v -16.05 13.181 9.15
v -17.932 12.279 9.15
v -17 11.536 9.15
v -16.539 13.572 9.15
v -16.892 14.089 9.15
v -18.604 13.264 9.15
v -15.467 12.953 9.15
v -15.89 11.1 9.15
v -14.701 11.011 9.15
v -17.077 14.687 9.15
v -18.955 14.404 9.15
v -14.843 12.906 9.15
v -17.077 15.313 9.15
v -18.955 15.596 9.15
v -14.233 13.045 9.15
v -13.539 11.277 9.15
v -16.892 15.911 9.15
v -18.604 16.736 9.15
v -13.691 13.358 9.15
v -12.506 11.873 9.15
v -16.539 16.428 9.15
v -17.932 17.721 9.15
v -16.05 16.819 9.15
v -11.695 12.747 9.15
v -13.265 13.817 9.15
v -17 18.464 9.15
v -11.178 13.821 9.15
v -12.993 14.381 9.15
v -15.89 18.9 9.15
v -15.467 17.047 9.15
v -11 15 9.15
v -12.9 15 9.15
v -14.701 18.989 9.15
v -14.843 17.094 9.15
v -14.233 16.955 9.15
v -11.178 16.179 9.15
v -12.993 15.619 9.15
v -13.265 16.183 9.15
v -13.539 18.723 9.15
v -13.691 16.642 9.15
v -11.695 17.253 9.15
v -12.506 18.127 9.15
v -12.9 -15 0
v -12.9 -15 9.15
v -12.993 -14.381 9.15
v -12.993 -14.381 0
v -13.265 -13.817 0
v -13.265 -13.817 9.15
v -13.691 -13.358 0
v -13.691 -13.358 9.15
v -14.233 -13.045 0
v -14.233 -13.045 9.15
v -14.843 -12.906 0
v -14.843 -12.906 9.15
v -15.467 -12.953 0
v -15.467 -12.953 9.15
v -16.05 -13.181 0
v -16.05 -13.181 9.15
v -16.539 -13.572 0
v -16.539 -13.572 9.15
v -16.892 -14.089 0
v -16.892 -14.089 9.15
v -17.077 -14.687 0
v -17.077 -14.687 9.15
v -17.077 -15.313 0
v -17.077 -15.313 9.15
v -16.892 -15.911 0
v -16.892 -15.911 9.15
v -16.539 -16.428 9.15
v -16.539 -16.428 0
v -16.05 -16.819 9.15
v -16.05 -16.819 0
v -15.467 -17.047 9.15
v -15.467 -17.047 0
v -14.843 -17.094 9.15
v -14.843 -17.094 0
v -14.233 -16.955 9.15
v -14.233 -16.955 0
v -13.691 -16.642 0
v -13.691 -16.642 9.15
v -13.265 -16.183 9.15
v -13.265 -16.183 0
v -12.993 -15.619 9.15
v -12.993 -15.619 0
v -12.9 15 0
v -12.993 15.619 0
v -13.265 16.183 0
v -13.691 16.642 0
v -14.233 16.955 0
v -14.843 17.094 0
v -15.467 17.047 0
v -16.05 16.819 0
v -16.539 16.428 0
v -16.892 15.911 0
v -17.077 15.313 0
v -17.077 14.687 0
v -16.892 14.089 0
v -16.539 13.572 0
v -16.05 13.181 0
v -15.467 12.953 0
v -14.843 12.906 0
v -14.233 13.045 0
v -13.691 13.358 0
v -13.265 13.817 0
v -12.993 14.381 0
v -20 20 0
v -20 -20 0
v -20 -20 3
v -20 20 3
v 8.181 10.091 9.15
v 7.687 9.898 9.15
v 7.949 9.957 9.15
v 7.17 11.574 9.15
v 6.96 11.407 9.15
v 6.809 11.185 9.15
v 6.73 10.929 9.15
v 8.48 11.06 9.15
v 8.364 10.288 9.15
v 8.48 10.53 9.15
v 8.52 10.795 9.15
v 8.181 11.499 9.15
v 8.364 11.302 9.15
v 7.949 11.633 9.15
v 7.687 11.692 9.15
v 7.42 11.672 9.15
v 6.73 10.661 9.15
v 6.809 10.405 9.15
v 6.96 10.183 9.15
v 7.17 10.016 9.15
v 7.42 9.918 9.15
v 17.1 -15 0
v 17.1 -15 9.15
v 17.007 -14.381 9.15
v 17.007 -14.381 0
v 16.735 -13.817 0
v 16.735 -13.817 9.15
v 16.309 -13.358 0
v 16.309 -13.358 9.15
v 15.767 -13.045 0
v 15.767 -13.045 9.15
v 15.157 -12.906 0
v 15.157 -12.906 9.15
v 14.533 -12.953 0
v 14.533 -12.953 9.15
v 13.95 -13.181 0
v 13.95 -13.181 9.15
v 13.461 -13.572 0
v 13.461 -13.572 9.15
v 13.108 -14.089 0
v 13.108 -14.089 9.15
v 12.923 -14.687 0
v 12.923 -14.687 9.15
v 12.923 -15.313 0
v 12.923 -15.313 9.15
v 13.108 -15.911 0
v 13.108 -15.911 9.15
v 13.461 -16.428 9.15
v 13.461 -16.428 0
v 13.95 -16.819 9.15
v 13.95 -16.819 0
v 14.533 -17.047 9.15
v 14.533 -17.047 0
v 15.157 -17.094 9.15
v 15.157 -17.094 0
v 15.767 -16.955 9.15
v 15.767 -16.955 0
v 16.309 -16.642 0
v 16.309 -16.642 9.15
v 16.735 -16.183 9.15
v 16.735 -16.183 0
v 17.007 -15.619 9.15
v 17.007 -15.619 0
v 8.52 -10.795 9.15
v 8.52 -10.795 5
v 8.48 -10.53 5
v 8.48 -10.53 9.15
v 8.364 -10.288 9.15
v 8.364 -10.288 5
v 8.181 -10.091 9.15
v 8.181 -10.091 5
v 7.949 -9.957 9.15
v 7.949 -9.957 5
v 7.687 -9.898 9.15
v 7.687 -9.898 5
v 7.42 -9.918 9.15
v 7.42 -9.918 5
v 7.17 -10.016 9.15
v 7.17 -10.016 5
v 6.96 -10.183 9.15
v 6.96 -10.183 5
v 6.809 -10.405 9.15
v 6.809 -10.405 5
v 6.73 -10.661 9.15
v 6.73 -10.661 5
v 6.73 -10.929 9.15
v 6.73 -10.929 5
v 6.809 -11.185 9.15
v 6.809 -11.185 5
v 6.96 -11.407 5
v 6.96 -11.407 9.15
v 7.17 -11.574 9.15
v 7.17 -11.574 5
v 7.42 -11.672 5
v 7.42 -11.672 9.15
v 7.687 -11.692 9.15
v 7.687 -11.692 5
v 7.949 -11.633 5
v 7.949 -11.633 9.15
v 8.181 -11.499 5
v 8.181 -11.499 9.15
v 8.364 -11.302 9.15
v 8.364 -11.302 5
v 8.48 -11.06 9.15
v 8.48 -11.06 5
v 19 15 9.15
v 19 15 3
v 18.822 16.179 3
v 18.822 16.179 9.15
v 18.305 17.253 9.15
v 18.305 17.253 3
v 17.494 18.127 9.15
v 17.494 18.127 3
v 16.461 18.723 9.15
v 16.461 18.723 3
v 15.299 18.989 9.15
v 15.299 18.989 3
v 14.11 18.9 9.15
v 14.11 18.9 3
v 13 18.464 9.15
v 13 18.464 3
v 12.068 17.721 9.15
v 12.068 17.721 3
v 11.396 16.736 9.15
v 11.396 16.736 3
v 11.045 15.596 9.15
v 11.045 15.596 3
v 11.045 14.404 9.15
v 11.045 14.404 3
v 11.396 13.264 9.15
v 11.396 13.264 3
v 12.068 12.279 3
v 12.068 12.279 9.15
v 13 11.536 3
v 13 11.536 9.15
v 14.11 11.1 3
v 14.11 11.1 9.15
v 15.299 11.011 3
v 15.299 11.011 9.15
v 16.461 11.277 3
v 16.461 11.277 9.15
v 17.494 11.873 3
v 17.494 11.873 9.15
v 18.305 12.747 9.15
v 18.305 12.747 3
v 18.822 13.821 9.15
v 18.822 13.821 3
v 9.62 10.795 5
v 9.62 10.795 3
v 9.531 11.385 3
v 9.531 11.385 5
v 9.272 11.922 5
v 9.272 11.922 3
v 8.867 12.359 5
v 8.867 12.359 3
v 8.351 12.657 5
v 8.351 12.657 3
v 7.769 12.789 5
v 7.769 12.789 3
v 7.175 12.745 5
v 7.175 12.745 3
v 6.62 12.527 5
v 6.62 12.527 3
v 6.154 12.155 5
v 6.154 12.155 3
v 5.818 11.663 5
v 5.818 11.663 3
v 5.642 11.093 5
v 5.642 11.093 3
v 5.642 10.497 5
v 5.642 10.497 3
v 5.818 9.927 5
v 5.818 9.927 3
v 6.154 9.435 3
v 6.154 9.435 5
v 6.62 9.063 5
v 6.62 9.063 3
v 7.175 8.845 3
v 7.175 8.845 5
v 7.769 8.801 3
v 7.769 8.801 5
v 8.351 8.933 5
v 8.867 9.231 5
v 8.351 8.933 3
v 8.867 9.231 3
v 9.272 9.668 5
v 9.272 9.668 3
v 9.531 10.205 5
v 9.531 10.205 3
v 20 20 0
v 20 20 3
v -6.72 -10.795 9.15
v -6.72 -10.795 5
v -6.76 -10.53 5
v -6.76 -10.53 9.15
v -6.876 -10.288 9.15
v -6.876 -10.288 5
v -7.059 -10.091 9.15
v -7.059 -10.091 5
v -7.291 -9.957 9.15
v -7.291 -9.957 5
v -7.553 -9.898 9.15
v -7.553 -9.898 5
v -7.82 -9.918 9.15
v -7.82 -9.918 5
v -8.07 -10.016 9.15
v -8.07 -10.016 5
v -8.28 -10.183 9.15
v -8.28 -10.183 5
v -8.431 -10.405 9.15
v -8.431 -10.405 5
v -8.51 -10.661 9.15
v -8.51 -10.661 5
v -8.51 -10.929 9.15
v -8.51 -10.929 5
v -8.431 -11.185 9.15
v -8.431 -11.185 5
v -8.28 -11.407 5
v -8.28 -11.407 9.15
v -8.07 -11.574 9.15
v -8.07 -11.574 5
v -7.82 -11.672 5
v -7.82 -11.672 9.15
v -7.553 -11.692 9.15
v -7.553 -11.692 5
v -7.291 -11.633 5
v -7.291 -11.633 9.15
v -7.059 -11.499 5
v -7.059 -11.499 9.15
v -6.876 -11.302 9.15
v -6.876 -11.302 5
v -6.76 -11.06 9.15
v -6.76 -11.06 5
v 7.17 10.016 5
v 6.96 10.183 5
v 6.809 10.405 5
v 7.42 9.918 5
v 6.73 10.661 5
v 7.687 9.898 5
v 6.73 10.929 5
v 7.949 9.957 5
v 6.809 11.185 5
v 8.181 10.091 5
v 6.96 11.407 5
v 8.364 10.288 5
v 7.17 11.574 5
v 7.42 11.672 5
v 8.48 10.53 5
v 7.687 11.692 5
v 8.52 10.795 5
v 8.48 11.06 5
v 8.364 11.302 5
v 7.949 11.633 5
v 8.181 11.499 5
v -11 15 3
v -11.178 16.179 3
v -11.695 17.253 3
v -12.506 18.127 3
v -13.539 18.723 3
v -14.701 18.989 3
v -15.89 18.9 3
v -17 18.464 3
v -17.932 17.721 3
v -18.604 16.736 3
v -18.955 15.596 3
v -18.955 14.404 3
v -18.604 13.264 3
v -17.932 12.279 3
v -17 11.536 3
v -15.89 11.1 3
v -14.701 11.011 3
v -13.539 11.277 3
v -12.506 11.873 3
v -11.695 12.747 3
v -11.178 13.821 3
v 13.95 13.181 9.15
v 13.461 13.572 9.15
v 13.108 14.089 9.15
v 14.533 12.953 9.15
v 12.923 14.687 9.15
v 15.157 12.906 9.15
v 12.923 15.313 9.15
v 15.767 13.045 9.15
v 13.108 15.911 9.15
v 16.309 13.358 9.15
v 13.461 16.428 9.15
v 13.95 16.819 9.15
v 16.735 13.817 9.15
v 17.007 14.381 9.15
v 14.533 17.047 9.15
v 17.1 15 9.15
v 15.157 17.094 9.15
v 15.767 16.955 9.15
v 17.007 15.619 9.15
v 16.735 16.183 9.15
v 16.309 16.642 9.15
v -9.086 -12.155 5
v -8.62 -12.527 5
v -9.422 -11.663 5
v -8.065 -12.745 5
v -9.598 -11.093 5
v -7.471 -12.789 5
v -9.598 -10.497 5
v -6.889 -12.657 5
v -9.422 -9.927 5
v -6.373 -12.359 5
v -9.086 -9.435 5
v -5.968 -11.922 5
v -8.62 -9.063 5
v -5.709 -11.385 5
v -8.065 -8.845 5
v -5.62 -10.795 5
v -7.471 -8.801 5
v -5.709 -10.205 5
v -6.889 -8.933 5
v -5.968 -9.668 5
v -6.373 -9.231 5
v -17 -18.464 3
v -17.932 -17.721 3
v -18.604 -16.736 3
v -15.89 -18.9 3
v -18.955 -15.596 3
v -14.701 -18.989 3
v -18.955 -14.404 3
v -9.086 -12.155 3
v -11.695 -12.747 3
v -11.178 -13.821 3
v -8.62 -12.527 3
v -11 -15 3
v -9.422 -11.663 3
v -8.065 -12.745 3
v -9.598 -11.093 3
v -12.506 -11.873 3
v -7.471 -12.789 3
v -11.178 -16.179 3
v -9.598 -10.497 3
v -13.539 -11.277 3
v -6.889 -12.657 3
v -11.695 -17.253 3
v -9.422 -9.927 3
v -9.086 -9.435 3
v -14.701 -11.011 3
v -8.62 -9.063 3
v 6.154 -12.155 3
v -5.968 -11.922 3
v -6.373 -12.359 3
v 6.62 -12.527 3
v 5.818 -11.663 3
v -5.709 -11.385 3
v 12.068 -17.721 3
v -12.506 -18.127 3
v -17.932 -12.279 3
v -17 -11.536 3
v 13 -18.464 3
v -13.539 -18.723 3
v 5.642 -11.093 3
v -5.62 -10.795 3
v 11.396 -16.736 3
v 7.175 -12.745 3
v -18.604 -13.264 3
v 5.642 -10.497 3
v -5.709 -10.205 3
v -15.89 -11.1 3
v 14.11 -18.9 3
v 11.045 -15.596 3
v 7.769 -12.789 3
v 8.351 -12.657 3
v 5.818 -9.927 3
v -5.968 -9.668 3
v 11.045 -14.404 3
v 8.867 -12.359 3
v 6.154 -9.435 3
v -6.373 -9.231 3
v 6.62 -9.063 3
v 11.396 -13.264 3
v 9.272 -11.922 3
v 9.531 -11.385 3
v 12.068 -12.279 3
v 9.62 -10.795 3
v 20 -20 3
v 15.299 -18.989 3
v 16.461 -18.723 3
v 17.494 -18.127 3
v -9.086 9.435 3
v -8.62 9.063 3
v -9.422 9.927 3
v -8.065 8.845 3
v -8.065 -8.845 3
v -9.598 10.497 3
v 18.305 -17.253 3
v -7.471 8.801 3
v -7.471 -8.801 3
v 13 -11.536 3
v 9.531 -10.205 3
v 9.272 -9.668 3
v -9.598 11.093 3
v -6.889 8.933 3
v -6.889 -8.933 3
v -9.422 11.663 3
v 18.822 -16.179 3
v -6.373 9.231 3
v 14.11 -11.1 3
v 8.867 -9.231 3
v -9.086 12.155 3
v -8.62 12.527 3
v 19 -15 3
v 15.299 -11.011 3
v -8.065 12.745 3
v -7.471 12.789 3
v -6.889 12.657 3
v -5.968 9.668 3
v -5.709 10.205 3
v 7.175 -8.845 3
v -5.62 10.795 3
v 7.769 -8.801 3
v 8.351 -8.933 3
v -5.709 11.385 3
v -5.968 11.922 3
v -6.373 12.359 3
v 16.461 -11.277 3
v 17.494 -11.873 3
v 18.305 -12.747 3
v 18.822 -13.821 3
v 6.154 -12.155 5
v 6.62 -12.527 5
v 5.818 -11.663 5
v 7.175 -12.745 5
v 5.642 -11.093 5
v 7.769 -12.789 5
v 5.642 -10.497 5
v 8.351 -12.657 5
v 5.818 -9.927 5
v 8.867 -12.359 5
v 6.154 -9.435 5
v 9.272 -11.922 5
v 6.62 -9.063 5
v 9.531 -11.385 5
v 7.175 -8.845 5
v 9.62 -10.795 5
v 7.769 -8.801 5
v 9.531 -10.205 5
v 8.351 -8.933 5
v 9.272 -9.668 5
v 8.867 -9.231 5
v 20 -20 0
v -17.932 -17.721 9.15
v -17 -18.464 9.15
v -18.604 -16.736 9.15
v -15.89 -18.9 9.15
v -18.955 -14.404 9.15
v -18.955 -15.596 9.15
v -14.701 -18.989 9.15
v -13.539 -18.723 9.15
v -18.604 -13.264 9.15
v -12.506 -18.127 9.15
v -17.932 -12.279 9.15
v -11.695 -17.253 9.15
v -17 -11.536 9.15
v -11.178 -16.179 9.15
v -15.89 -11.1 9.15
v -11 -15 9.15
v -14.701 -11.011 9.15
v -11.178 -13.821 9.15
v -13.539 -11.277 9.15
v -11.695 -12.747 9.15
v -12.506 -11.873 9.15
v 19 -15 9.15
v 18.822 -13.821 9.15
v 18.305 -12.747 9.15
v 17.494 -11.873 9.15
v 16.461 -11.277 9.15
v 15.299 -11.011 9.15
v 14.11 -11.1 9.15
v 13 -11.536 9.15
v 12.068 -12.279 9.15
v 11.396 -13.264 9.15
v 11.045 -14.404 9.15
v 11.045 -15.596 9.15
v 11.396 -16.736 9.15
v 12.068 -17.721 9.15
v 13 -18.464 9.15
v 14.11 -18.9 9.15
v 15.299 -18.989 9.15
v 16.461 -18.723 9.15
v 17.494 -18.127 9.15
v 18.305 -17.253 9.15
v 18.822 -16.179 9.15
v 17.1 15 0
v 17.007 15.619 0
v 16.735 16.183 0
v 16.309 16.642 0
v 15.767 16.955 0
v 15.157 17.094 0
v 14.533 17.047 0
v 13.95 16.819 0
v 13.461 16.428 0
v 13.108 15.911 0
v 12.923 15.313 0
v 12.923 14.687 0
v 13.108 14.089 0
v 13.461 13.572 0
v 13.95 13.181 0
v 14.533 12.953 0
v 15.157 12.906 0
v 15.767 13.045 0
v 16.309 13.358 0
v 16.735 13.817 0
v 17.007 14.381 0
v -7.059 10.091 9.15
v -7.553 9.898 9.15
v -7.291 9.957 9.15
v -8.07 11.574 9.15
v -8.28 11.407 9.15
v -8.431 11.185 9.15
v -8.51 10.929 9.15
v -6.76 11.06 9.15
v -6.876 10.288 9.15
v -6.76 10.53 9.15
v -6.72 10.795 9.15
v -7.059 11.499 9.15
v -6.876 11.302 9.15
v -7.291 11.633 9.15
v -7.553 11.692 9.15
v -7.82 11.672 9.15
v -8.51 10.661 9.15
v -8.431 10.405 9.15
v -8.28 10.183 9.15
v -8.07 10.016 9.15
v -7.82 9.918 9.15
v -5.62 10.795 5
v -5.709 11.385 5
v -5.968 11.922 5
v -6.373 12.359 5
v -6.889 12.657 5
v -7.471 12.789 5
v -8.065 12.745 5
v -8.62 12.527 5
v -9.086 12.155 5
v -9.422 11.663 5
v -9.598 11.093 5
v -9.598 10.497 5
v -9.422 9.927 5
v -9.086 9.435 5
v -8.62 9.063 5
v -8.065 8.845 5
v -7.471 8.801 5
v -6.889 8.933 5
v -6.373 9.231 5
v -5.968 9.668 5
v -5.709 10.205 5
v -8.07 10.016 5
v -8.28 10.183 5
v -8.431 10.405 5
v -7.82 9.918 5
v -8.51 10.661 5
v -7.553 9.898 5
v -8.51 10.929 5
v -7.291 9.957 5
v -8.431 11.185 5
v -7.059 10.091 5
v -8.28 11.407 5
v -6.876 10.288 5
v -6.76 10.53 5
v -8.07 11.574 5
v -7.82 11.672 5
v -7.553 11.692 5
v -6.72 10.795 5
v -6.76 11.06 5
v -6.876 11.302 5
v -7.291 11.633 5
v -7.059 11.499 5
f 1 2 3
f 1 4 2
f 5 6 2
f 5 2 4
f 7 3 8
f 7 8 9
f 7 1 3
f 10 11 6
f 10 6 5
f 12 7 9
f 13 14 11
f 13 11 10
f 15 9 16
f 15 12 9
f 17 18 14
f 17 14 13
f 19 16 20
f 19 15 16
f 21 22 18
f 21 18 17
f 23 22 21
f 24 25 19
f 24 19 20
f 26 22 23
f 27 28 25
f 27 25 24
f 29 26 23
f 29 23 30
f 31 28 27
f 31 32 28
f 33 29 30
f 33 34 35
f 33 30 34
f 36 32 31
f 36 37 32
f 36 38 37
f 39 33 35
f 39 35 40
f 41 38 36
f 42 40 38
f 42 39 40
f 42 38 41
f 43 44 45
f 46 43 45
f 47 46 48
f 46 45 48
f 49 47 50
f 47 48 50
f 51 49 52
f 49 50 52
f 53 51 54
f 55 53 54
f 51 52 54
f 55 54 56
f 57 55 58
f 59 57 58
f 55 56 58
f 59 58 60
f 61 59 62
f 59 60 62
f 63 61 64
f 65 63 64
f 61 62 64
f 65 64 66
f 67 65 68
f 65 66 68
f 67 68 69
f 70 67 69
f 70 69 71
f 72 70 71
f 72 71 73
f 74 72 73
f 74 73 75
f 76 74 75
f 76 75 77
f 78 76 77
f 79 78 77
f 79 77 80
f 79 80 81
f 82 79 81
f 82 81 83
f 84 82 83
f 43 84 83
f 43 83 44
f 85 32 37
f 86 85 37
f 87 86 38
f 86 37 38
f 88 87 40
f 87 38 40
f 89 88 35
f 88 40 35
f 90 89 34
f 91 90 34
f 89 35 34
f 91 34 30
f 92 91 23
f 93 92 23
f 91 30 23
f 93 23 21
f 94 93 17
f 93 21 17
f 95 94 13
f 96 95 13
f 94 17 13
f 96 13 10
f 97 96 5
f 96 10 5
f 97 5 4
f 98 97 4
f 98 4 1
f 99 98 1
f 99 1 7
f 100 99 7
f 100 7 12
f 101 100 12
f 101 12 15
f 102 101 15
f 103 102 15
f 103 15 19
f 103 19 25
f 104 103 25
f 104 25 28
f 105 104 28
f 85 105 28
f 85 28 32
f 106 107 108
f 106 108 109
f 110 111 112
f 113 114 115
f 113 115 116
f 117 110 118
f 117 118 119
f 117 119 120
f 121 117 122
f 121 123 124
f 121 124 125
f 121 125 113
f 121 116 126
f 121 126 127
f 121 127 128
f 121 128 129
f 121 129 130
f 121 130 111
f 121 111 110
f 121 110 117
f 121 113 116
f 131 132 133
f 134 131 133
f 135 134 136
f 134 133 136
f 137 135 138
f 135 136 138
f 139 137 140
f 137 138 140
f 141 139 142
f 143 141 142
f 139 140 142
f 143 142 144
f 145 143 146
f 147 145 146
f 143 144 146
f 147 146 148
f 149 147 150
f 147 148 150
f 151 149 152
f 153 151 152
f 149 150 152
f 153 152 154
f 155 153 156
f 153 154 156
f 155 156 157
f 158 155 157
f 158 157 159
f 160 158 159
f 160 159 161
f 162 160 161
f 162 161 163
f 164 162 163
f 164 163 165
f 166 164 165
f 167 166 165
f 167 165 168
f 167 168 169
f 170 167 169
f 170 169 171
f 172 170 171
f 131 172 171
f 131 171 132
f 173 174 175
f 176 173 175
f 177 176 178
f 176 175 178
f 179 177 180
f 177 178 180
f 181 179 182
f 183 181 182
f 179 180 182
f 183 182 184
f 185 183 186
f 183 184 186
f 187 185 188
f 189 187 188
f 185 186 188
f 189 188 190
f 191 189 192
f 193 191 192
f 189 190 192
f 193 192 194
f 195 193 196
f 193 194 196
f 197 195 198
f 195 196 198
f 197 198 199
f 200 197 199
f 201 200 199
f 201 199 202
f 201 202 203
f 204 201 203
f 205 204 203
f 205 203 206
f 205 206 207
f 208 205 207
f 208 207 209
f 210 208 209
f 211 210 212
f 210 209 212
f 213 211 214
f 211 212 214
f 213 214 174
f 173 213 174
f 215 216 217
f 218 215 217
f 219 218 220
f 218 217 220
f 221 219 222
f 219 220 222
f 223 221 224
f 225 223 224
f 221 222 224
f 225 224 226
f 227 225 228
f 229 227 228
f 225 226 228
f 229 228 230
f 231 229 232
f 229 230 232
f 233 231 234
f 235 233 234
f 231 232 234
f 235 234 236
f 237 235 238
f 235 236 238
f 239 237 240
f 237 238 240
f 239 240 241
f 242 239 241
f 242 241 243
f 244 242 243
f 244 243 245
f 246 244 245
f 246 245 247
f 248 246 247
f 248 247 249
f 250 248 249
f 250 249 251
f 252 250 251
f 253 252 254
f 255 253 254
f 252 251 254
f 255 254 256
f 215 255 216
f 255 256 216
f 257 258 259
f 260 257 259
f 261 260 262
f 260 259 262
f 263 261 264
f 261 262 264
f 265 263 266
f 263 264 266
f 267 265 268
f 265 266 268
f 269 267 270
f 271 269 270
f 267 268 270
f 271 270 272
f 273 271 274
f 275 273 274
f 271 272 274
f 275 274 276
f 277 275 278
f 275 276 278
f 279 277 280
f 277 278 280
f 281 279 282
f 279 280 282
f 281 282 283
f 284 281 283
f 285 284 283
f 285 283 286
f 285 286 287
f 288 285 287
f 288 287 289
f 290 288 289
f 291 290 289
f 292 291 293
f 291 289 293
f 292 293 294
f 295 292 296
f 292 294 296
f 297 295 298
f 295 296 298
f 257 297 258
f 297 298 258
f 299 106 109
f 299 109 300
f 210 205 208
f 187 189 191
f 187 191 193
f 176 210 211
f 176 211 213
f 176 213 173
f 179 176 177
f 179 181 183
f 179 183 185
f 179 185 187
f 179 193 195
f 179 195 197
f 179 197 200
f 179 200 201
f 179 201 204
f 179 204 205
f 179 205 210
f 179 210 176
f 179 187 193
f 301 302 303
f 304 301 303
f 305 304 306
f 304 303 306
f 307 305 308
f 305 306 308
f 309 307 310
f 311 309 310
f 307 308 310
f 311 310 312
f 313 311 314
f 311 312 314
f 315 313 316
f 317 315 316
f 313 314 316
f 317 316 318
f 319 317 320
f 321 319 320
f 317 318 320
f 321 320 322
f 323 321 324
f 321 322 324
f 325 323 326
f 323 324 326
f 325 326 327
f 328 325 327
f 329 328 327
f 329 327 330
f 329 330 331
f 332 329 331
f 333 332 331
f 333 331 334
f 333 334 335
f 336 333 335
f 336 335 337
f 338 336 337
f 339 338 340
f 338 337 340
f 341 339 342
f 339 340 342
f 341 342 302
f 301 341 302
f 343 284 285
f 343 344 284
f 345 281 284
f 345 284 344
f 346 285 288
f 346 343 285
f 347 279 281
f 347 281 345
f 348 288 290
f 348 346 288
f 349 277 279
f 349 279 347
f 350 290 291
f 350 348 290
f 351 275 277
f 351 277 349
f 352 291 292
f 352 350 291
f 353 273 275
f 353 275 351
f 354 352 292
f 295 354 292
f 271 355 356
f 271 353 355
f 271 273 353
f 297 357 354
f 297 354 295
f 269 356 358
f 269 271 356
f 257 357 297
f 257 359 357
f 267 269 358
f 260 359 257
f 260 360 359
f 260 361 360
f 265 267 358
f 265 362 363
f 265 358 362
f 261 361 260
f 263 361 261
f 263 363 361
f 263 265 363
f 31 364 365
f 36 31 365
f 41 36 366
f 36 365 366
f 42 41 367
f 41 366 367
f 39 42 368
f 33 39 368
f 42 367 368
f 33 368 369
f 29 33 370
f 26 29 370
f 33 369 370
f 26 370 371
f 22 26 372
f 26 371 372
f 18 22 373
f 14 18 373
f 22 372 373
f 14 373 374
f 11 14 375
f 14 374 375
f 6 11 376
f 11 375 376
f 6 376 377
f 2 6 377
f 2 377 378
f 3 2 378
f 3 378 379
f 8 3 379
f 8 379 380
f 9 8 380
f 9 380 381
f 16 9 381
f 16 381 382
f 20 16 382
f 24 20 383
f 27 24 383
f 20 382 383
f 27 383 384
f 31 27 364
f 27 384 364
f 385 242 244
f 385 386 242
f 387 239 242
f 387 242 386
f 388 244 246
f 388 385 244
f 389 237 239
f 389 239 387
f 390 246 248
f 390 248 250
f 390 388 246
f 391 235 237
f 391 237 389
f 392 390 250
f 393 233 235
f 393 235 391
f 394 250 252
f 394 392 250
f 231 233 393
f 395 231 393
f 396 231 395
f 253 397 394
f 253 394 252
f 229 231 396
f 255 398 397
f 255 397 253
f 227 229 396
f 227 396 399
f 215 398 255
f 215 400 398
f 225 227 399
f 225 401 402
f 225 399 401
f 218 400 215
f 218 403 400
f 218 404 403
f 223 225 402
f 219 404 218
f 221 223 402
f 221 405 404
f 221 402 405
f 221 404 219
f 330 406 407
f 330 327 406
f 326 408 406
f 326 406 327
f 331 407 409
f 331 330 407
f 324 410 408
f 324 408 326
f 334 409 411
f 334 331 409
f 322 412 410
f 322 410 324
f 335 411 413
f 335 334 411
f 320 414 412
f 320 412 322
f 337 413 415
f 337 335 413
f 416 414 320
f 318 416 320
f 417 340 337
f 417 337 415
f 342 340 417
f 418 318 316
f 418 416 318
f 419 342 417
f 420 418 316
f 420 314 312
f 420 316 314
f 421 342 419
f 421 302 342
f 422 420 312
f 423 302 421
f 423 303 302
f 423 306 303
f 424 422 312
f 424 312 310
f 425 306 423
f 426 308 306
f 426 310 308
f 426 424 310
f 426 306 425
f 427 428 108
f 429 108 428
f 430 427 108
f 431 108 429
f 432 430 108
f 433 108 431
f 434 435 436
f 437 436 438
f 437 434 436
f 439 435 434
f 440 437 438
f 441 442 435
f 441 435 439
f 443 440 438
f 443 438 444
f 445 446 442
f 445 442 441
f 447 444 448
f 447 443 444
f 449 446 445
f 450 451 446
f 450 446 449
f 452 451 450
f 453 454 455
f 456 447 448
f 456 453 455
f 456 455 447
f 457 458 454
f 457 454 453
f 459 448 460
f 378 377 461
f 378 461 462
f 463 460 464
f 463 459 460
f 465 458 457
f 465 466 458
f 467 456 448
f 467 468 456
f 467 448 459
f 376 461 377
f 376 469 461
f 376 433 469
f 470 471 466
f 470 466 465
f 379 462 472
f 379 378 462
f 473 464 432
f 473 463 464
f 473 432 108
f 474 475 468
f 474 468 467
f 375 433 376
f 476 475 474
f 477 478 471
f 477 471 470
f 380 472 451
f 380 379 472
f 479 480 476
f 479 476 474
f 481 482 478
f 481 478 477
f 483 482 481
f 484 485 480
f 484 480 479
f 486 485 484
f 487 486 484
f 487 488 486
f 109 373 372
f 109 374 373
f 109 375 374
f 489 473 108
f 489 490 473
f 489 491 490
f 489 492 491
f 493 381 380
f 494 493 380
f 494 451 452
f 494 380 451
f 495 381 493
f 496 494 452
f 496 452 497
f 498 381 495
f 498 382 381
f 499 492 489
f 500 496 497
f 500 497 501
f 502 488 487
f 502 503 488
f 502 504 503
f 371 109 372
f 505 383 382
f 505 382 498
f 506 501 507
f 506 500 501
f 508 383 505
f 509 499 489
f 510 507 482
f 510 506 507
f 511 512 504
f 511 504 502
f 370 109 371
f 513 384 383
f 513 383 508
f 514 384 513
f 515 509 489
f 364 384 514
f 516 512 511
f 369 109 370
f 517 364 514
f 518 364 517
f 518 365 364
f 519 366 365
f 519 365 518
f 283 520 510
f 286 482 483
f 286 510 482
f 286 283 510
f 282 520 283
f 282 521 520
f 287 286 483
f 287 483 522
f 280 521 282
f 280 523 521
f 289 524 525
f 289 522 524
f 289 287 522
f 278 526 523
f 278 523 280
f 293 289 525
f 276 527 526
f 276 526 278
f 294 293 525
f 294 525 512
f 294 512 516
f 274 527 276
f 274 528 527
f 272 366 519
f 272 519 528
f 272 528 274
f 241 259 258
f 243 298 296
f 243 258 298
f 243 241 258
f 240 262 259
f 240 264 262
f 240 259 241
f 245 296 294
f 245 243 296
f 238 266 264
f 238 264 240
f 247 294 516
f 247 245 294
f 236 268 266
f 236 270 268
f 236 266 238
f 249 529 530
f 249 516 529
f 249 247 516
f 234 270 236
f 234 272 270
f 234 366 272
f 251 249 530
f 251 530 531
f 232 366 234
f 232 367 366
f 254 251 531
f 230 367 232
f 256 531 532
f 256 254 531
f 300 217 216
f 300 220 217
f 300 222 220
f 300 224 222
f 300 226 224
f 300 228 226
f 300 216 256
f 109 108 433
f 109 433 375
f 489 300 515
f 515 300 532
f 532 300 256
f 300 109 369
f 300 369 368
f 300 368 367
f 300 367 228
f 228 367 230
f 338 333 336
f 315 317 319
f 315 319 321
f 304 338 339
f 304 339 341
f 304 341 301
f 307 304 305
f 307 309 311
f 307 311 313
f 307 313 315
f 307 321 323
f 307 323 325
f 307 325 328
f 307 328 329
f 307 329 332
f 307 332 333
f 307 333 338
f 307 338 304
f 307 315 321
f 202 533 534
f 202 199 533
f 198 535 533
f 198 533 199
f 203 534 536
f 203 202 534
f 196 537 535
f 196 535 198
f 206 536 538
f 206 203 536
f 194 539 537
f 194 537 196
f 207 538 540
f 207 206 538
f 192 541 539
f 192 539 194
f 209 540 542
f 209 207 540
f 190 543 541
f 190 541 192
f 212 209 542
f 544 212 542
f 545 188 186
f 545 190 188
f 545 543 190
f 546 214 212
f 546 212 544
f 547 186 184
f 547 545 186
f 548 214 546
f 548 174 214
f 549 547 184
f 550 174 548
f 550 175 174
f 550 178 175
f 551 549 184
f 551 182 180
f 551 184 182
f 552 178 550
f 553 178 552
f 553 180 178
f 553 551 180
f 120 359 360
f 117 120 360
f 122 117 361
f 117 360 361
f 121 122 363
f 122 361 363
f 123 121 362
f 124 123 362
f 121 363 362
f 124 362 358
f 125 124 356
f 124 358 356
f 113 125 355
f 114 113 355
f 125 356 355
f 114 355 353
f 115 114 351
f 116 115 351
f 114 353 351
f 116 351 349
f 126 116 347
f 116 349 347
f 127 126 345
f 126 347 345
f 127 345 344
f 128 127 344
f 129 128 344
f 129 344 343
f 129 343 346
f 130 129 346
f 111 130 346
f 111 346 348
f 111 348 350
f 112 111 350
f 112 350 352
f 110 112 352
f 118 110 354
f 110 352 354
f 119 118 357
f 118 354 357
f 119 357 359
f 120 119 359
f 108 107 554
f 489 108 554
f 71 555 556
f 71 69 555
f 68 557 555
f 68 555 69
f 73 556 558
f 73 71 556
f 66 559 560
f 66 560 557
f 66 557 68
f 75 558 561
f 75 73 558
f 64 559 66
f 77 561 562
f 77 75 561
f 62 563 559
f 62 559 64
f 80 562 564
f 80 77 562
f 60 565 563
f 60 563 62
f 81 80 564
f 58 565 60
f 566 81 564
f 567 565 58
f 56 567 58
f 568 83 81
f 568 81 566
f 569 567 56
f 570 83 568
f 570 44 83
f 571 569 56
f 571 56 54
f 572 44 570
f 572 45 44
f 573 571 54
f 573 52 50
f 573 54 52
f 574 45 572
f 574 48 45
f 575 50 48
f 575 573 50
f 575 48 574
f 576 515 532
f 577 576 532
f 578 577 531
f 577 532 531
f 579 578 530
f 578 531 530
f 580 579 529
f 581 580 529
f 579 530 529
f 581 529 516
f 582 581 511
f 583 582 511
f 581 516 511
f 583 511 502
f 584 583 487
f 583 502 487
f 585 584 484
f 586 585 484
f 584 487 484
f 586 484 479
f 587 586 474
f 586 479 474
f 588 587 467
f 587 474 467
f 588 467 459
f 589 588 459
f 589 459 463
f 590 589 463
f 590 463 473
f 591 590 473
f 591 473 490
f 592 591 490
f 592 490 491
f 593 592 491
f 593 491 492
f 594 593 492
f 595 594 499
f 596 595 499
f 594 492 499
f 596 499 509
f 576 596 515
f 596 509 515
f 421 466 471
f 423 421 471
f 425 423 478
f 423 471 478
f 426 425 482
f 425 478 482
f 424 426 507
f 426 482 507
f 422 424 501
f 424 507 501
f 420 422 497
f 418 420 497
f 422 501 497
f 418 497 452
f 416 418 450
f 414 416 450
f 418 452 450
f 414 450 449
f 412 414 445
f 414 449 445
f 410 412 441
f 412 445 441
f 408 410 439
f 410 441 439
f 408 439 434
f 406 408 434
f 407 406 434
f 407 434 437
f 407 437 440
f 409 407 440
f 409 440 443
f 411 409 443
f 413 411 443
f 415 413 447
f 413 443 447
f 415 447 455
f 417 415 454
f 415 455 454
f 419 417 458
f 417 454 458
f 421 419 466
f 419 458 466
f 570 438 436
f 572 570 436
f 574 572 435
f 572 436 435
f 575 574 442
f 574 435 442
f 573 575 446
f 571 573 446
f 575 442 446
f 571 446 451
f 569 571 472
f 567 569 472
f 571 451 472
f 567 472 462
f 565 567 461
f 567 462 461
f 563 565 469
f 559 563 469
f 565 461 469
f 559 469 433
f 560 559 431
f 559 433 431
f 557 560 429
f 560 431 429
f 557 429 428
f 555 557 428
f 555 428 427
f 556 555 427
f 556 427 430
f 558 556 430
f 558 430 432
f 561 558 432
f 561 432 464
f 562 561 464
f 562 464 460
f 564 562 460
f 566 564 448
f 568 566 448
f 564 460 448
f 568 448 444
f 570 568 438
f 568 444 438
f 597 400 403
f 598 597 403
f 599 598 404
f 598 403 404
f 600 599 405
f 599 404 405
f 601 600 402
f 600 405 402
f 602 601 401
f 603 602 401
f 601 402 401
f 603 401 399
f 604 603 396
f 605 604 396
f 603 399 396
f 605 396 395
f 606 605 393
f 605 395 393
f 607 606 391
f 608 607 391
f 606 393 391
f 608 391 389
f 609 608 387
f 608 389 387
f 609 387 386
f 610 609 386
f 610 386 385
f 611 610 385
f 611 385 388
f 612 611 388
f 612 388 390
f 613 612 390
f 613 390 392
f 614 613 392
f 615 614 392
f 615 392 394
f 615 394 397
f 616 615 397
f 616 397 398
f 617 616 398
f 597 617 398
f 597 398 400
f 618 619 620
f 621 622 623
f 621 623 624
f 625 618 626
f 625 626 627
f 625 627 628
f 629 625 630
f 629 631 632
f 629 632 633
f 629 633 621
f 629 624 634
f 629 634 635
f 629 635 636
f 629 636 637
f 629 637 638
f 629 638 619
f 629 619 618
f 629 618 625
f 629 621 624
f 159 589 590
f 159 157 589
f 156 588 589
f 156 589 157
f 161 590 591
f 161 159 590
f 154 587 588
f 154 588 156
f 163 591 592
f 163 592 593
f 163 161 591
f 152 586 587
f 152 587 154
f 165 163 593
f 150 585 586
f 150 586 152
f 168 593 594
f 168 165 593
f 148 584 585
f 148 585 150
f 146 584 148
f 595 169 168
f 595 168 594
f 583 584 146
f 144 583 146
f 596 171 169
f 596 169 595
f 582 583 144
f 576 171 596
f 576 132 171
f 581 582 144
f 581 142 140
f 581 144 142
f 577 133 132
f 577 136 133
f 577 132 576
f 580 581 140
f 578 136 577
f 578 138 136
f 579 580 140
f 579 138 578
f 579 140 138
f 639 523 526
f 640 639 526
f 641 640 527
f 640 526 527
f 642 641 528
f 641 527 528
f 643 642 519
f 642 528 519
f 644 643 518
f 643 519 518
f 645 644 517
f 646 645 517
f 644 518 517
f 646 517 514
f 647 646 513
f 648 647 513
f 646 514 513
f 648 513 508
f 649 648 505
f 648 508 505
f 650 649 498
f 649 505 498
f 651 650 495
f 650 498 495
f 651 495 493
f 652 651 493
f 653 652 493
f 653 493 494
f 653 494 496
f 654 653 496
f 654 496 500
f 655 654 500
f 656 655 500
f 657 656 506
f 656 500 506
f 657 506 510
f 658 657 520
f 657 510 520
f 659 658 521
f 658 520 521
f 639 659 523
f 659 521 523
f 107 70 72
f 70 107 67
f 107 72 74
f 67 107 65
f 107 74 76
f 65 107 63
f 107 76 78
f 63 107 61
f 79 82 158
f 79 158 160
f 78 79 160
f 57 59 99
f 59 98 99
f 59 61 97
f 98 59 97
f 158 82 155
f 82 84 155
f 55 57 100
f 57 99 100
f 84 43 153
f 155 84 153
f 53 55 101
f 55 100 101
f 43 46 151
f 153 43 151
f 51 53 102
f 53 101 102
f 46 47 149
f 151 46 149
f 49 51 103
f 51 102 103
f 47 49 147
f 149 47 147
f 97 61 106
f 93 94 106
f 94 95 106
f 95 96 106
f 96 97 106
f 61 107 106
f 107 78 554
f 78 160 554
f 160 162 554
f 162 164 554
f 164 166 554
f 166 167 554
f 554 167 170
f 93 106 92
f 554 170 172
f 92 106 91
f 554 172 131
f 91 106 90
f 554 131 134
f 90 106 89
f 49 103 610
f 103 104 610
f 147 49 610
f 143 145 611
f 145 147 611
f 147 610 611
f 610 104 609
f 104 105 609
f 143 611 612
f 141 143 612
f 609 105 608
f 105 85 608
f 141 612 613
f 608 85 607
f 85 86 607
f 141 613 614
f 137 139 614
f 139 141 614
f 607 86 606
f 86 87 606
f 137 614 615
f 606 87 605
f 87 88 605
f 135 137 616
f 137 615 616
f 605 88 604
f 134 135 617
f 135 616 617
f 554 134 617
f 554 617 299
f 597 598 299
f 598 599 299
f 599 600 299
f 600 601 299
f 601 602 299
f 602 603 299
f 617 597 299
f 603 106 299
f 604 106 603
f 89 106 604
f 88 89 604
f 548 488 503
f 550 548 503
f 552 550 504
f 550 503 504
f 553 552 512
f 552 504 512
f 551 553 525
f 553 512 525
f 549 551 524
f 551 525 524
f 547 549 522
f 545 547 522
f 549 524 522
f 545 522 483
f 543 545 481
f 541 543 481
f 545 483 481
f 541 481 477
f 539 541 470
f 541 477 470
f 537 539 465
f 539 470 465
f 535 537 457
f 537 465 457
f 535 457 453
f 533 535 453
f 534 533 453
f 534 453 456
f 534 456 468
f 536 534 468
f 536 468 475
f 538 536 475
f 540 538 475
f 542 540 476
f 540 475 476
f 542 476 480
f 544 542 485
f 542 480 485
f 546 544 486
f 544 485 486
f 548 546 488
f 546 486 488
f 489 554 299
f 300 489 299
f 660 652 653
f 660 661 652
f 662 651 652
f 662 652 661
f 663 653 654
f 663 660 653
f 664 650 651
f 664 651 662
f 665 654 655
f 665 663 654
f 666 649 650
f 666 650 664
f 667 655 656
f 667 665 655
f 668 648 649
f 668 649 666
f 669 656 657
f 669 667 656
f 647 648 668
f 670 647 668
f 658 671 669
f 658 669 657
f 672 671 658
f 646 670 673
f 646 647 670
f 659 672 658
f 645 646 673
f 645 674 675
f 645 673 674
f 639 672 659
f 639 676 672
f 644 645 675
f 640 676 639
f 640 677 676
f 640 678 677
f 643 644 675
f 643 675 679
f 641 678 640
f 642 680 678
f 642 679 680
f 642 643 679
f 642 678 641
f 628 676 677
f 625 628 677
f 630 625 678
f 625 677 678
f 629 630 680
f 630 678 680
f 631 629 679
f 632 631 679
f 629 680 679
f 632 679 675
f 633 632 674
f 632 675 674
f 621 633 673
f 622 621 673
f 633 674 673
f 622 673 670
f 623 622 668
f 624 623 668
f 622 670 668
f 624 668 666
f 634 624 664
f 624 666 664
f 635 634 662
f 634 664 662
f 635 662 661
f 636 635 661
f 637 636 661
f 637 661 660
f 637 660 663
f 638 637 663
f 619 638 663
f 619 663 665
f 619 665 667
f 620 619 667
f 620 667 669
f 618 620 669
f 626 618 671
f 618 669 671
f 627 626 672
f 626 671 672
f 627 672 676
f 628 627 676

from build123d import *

# Parameters (mm, degrees)
SKETCH_1_W          = 40
SKETCH_1_H          = 40
EXTRUDE_1_DEPTH     = 3
SKETCH_2_R          = 2
EXTRUDE_2_DEPTH     = 2
SKETCH_3_R          = 0.9
EXTRUDE_3_DEPTH     = 4.15
SKETCH_4_R          = 4
EXTRUDE_4_DEPTH     = 6.15
SKETCH_5_R          = 2.1
CUT_EXTRUDE_1_DEPTH = 10.15


with BuildPart() as part:
    # 草圖1 → 填料-伸長1 (new body)
    with BuildSketch(Plane.XY):
        Rectangle(SKETCH_1_W, SKETCH_1_H)
    extrude(amount=EXTRUDE_1_DEPTH)

    # 草圖2 → 填料-伸長2 (add)
    with BuildSketch(Plane.XY.offset(3)):
        with Locations((-7.62, 10.795)):
            Circle(SKETCH_2_R)
        with Locations((-7.62, -10.795)):
            Circle(SKETCH_2_R)
        with Locations((7.62, 10.795)):
            Circle(SKETCH_2_R)
        with Locations((7.62, -10.795)):
            Circle(SKETCH_2_R)
    extrude(amount=EXTRUDE_2_DEPTH)

    # 草圖3 → 填料-伸長3 (add)
    with BuildSketch(Plane.XY.offset(5)):
        with Locations((-7.62, 10.795)):
            Circle(SKETCH_3_R)
        with Locations((-7.62, -10.795)):
            Circle(SKETCH_3_R)
        with Locations((7.62, -10.795)):
            Circle(SKETCH_3_R)
        with Locations((7.62, 10.795)):
            Circle(SKETCH_3_R)
    extrude(amount=EXTRUDE_3_DEPTH)

    # 草圖4 → 填料-伸長4 (add)
    with BuildSketch(Plane.XY.offset(3)):
        with Locations((-15, 15)):
            Circle(SKETCH_4_R)
        with Locations((-15, -15)):
            Circle(SKETCH_4_R)
        with Locations((15, -15)):
            Circle(SKETCH_4_R)
        with Locations((15, 15)):
            Circle(SKETCH_4_R)
    extrude(amount=EXTRUDE_4_DEPTH)

    # 草圖5 → 除料-伸長1 (cut, through all)
    with BuildSketch(Plane.XY.offset(9.15)):
        with Locations((-15, 15)):
            Circle(SKETCH_5_R)
        with Locations((-15, -15)):
            Circle(SKETCH_5_R)
        with Locations((15, -15)):
            Circle(SKETCH_5_R)
        with Locations((15, 15)):
            Circle(SKETCH_5_R)
    extrude(amount=-CUT_EXTRUDE_1_DEPTH, mode=Mode.SUBTRACT)


solid = part.part
